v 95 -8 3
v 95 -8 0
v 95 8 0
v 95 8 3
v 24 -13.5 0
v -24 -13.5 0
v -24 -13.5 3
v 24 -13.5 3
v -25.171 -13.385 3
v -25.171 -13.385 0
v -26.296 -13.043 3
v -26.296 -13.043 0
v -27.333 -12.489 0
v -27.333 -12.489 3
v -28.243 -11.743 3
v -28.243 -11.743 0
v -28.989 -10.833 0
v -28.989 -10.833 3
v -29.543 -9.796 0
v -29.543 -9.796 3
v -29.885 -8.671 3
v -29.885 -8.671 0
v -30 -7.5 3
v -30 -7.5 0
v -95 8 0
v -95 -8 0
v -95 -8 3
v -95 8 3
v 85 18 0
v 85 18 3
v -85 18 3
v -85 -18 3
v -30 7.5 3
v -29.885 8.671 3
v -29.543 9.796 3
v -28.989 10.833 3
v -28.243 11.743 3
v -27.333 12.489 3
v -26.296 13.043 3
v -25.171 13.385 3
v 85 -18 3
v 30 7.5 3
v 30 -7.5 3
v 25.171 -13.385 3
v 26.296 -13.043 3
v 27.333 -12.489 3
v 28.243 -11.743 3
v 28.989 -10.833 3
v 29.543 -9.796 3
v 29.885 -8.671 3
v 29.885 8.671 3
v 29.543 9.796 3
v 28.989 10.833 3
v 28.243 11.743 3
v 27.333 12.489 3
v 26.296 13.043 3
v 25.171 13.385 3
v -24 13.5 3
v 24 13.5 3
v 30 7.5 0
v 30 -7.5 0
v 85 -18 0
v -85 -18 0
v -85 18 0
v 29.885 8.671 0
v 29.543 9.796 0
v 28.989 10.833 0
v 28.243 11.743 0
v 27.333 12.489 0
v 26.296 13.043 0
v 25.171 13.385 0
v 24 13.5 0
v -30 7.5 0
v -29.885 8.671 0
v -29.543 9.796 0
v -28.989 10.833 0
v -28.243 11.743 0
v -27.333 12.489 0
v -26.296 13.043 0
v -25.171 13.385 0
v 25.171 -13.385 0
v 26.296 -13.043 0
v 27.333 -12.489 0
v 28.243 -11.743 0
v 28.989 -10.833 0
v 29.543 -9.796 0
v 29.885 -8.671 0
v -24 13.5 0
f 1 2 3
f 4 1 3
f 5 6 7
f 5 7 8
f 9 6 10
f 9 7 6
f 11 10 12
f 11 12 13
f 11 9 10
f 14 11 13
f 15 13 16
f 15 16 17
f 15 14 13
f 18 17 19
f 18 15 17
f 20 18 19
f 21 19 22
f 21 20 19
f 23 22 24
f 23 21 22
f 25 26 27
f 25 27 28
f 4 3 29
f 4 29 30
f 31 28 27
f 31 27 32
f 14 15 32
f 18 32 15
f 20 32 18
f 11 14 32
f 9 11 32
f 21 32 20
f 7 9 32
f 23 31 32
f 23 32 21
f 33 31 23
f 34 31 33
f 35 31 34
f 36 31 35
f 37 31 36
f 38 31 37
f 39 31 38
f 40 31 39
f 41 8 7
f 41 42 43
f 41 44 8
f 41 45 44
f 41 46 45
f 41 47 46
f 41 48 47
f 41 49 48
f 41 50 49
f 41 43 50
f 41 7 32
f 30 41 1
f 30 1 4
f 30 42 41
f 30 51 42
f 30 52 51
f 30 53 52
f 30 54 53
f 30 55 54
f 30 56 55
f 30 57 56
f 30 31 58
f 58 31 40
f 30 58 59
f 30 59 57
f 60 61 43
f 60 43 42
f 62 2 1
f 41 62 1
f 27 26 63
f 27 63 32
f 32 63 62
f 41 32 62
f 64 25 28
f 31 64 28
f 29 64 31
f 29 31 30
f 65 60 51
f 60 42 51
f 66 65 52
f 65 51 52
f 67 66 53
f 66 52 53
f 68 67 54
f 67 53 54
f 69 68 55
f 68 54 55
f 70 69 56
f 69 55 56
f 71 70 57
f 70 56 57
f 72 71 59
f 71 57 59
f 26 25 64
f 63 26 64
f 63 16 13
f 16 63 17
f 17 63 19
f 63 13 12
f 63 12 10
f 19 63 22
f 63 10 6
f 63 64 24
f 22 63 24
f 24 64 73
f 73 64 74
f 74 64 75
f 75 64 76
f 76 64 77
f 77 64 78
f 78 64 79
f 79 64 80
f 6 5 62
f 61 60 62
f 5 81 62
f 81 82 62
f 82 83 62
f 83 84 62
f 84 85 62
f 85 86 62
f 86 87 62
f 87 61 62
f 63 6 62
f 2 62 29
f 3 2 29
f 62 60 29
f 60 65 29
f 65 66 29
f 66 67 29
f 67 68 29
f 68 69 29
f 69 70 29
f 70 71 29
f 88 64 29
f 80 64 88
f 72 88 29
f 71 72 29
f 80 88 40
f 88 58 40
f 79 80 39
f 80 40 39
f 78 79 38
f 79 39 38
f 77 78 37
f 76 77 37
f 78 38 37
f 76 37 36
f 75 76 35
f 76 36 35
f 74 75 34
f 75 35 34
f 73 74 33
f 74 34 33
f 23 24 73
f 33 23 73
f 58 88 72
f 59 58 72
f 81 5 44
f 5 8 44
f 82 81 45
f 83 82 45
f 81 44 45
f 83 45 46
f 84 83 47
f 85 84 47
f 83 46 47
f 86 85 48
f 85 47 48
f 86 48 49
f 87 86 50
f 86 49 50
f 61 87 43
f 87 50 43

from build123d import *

# Parameters (mm, degrees)
SKETCH_W     = 190
SKETCH_H     = 36
SKETCH_W_2   = 60
SKETCH_H_2   = 27
PAD_DEPTH    = 3
CHAMFER_SIZE = 10
FILLET_R     = 6


with BuildPart() as part:
    # Sketch → Pad (new body)
    with BuildSketch(Plane.XY):
        Rectangle(SKETCH_W, SKETCH_H)
        Rectangle(SKETCH_W_2, SKETCH_H_2, mode=Mode.SUBTRACT)
    extrude(amount=PAD_DEPTH)

    # Chamfer
    chamfer_edges = [part.edges().sort_by_distance(p)[0] for p in [
        (-95, -18, 1.5),
        (-95, 18, 1.5),
        (95, -18, 1.5),
        (95, 18, 1.5),
    ]]
    chamfer(chamfer_edges, length=CHAMFER_SIZE)

    # Fillet
    fillet_edges = [part.edges().sort_by_distance(p)[0] for p in [
        (-30, -13.5, 1.5),
        (-30, 13.5, 1.5),
        (30, 13.5, 1.5),
        (30, -13.5, 1.5),
    ]]
    fillet(fillet_edges, radius=FILLET_R)


solid = part.part
